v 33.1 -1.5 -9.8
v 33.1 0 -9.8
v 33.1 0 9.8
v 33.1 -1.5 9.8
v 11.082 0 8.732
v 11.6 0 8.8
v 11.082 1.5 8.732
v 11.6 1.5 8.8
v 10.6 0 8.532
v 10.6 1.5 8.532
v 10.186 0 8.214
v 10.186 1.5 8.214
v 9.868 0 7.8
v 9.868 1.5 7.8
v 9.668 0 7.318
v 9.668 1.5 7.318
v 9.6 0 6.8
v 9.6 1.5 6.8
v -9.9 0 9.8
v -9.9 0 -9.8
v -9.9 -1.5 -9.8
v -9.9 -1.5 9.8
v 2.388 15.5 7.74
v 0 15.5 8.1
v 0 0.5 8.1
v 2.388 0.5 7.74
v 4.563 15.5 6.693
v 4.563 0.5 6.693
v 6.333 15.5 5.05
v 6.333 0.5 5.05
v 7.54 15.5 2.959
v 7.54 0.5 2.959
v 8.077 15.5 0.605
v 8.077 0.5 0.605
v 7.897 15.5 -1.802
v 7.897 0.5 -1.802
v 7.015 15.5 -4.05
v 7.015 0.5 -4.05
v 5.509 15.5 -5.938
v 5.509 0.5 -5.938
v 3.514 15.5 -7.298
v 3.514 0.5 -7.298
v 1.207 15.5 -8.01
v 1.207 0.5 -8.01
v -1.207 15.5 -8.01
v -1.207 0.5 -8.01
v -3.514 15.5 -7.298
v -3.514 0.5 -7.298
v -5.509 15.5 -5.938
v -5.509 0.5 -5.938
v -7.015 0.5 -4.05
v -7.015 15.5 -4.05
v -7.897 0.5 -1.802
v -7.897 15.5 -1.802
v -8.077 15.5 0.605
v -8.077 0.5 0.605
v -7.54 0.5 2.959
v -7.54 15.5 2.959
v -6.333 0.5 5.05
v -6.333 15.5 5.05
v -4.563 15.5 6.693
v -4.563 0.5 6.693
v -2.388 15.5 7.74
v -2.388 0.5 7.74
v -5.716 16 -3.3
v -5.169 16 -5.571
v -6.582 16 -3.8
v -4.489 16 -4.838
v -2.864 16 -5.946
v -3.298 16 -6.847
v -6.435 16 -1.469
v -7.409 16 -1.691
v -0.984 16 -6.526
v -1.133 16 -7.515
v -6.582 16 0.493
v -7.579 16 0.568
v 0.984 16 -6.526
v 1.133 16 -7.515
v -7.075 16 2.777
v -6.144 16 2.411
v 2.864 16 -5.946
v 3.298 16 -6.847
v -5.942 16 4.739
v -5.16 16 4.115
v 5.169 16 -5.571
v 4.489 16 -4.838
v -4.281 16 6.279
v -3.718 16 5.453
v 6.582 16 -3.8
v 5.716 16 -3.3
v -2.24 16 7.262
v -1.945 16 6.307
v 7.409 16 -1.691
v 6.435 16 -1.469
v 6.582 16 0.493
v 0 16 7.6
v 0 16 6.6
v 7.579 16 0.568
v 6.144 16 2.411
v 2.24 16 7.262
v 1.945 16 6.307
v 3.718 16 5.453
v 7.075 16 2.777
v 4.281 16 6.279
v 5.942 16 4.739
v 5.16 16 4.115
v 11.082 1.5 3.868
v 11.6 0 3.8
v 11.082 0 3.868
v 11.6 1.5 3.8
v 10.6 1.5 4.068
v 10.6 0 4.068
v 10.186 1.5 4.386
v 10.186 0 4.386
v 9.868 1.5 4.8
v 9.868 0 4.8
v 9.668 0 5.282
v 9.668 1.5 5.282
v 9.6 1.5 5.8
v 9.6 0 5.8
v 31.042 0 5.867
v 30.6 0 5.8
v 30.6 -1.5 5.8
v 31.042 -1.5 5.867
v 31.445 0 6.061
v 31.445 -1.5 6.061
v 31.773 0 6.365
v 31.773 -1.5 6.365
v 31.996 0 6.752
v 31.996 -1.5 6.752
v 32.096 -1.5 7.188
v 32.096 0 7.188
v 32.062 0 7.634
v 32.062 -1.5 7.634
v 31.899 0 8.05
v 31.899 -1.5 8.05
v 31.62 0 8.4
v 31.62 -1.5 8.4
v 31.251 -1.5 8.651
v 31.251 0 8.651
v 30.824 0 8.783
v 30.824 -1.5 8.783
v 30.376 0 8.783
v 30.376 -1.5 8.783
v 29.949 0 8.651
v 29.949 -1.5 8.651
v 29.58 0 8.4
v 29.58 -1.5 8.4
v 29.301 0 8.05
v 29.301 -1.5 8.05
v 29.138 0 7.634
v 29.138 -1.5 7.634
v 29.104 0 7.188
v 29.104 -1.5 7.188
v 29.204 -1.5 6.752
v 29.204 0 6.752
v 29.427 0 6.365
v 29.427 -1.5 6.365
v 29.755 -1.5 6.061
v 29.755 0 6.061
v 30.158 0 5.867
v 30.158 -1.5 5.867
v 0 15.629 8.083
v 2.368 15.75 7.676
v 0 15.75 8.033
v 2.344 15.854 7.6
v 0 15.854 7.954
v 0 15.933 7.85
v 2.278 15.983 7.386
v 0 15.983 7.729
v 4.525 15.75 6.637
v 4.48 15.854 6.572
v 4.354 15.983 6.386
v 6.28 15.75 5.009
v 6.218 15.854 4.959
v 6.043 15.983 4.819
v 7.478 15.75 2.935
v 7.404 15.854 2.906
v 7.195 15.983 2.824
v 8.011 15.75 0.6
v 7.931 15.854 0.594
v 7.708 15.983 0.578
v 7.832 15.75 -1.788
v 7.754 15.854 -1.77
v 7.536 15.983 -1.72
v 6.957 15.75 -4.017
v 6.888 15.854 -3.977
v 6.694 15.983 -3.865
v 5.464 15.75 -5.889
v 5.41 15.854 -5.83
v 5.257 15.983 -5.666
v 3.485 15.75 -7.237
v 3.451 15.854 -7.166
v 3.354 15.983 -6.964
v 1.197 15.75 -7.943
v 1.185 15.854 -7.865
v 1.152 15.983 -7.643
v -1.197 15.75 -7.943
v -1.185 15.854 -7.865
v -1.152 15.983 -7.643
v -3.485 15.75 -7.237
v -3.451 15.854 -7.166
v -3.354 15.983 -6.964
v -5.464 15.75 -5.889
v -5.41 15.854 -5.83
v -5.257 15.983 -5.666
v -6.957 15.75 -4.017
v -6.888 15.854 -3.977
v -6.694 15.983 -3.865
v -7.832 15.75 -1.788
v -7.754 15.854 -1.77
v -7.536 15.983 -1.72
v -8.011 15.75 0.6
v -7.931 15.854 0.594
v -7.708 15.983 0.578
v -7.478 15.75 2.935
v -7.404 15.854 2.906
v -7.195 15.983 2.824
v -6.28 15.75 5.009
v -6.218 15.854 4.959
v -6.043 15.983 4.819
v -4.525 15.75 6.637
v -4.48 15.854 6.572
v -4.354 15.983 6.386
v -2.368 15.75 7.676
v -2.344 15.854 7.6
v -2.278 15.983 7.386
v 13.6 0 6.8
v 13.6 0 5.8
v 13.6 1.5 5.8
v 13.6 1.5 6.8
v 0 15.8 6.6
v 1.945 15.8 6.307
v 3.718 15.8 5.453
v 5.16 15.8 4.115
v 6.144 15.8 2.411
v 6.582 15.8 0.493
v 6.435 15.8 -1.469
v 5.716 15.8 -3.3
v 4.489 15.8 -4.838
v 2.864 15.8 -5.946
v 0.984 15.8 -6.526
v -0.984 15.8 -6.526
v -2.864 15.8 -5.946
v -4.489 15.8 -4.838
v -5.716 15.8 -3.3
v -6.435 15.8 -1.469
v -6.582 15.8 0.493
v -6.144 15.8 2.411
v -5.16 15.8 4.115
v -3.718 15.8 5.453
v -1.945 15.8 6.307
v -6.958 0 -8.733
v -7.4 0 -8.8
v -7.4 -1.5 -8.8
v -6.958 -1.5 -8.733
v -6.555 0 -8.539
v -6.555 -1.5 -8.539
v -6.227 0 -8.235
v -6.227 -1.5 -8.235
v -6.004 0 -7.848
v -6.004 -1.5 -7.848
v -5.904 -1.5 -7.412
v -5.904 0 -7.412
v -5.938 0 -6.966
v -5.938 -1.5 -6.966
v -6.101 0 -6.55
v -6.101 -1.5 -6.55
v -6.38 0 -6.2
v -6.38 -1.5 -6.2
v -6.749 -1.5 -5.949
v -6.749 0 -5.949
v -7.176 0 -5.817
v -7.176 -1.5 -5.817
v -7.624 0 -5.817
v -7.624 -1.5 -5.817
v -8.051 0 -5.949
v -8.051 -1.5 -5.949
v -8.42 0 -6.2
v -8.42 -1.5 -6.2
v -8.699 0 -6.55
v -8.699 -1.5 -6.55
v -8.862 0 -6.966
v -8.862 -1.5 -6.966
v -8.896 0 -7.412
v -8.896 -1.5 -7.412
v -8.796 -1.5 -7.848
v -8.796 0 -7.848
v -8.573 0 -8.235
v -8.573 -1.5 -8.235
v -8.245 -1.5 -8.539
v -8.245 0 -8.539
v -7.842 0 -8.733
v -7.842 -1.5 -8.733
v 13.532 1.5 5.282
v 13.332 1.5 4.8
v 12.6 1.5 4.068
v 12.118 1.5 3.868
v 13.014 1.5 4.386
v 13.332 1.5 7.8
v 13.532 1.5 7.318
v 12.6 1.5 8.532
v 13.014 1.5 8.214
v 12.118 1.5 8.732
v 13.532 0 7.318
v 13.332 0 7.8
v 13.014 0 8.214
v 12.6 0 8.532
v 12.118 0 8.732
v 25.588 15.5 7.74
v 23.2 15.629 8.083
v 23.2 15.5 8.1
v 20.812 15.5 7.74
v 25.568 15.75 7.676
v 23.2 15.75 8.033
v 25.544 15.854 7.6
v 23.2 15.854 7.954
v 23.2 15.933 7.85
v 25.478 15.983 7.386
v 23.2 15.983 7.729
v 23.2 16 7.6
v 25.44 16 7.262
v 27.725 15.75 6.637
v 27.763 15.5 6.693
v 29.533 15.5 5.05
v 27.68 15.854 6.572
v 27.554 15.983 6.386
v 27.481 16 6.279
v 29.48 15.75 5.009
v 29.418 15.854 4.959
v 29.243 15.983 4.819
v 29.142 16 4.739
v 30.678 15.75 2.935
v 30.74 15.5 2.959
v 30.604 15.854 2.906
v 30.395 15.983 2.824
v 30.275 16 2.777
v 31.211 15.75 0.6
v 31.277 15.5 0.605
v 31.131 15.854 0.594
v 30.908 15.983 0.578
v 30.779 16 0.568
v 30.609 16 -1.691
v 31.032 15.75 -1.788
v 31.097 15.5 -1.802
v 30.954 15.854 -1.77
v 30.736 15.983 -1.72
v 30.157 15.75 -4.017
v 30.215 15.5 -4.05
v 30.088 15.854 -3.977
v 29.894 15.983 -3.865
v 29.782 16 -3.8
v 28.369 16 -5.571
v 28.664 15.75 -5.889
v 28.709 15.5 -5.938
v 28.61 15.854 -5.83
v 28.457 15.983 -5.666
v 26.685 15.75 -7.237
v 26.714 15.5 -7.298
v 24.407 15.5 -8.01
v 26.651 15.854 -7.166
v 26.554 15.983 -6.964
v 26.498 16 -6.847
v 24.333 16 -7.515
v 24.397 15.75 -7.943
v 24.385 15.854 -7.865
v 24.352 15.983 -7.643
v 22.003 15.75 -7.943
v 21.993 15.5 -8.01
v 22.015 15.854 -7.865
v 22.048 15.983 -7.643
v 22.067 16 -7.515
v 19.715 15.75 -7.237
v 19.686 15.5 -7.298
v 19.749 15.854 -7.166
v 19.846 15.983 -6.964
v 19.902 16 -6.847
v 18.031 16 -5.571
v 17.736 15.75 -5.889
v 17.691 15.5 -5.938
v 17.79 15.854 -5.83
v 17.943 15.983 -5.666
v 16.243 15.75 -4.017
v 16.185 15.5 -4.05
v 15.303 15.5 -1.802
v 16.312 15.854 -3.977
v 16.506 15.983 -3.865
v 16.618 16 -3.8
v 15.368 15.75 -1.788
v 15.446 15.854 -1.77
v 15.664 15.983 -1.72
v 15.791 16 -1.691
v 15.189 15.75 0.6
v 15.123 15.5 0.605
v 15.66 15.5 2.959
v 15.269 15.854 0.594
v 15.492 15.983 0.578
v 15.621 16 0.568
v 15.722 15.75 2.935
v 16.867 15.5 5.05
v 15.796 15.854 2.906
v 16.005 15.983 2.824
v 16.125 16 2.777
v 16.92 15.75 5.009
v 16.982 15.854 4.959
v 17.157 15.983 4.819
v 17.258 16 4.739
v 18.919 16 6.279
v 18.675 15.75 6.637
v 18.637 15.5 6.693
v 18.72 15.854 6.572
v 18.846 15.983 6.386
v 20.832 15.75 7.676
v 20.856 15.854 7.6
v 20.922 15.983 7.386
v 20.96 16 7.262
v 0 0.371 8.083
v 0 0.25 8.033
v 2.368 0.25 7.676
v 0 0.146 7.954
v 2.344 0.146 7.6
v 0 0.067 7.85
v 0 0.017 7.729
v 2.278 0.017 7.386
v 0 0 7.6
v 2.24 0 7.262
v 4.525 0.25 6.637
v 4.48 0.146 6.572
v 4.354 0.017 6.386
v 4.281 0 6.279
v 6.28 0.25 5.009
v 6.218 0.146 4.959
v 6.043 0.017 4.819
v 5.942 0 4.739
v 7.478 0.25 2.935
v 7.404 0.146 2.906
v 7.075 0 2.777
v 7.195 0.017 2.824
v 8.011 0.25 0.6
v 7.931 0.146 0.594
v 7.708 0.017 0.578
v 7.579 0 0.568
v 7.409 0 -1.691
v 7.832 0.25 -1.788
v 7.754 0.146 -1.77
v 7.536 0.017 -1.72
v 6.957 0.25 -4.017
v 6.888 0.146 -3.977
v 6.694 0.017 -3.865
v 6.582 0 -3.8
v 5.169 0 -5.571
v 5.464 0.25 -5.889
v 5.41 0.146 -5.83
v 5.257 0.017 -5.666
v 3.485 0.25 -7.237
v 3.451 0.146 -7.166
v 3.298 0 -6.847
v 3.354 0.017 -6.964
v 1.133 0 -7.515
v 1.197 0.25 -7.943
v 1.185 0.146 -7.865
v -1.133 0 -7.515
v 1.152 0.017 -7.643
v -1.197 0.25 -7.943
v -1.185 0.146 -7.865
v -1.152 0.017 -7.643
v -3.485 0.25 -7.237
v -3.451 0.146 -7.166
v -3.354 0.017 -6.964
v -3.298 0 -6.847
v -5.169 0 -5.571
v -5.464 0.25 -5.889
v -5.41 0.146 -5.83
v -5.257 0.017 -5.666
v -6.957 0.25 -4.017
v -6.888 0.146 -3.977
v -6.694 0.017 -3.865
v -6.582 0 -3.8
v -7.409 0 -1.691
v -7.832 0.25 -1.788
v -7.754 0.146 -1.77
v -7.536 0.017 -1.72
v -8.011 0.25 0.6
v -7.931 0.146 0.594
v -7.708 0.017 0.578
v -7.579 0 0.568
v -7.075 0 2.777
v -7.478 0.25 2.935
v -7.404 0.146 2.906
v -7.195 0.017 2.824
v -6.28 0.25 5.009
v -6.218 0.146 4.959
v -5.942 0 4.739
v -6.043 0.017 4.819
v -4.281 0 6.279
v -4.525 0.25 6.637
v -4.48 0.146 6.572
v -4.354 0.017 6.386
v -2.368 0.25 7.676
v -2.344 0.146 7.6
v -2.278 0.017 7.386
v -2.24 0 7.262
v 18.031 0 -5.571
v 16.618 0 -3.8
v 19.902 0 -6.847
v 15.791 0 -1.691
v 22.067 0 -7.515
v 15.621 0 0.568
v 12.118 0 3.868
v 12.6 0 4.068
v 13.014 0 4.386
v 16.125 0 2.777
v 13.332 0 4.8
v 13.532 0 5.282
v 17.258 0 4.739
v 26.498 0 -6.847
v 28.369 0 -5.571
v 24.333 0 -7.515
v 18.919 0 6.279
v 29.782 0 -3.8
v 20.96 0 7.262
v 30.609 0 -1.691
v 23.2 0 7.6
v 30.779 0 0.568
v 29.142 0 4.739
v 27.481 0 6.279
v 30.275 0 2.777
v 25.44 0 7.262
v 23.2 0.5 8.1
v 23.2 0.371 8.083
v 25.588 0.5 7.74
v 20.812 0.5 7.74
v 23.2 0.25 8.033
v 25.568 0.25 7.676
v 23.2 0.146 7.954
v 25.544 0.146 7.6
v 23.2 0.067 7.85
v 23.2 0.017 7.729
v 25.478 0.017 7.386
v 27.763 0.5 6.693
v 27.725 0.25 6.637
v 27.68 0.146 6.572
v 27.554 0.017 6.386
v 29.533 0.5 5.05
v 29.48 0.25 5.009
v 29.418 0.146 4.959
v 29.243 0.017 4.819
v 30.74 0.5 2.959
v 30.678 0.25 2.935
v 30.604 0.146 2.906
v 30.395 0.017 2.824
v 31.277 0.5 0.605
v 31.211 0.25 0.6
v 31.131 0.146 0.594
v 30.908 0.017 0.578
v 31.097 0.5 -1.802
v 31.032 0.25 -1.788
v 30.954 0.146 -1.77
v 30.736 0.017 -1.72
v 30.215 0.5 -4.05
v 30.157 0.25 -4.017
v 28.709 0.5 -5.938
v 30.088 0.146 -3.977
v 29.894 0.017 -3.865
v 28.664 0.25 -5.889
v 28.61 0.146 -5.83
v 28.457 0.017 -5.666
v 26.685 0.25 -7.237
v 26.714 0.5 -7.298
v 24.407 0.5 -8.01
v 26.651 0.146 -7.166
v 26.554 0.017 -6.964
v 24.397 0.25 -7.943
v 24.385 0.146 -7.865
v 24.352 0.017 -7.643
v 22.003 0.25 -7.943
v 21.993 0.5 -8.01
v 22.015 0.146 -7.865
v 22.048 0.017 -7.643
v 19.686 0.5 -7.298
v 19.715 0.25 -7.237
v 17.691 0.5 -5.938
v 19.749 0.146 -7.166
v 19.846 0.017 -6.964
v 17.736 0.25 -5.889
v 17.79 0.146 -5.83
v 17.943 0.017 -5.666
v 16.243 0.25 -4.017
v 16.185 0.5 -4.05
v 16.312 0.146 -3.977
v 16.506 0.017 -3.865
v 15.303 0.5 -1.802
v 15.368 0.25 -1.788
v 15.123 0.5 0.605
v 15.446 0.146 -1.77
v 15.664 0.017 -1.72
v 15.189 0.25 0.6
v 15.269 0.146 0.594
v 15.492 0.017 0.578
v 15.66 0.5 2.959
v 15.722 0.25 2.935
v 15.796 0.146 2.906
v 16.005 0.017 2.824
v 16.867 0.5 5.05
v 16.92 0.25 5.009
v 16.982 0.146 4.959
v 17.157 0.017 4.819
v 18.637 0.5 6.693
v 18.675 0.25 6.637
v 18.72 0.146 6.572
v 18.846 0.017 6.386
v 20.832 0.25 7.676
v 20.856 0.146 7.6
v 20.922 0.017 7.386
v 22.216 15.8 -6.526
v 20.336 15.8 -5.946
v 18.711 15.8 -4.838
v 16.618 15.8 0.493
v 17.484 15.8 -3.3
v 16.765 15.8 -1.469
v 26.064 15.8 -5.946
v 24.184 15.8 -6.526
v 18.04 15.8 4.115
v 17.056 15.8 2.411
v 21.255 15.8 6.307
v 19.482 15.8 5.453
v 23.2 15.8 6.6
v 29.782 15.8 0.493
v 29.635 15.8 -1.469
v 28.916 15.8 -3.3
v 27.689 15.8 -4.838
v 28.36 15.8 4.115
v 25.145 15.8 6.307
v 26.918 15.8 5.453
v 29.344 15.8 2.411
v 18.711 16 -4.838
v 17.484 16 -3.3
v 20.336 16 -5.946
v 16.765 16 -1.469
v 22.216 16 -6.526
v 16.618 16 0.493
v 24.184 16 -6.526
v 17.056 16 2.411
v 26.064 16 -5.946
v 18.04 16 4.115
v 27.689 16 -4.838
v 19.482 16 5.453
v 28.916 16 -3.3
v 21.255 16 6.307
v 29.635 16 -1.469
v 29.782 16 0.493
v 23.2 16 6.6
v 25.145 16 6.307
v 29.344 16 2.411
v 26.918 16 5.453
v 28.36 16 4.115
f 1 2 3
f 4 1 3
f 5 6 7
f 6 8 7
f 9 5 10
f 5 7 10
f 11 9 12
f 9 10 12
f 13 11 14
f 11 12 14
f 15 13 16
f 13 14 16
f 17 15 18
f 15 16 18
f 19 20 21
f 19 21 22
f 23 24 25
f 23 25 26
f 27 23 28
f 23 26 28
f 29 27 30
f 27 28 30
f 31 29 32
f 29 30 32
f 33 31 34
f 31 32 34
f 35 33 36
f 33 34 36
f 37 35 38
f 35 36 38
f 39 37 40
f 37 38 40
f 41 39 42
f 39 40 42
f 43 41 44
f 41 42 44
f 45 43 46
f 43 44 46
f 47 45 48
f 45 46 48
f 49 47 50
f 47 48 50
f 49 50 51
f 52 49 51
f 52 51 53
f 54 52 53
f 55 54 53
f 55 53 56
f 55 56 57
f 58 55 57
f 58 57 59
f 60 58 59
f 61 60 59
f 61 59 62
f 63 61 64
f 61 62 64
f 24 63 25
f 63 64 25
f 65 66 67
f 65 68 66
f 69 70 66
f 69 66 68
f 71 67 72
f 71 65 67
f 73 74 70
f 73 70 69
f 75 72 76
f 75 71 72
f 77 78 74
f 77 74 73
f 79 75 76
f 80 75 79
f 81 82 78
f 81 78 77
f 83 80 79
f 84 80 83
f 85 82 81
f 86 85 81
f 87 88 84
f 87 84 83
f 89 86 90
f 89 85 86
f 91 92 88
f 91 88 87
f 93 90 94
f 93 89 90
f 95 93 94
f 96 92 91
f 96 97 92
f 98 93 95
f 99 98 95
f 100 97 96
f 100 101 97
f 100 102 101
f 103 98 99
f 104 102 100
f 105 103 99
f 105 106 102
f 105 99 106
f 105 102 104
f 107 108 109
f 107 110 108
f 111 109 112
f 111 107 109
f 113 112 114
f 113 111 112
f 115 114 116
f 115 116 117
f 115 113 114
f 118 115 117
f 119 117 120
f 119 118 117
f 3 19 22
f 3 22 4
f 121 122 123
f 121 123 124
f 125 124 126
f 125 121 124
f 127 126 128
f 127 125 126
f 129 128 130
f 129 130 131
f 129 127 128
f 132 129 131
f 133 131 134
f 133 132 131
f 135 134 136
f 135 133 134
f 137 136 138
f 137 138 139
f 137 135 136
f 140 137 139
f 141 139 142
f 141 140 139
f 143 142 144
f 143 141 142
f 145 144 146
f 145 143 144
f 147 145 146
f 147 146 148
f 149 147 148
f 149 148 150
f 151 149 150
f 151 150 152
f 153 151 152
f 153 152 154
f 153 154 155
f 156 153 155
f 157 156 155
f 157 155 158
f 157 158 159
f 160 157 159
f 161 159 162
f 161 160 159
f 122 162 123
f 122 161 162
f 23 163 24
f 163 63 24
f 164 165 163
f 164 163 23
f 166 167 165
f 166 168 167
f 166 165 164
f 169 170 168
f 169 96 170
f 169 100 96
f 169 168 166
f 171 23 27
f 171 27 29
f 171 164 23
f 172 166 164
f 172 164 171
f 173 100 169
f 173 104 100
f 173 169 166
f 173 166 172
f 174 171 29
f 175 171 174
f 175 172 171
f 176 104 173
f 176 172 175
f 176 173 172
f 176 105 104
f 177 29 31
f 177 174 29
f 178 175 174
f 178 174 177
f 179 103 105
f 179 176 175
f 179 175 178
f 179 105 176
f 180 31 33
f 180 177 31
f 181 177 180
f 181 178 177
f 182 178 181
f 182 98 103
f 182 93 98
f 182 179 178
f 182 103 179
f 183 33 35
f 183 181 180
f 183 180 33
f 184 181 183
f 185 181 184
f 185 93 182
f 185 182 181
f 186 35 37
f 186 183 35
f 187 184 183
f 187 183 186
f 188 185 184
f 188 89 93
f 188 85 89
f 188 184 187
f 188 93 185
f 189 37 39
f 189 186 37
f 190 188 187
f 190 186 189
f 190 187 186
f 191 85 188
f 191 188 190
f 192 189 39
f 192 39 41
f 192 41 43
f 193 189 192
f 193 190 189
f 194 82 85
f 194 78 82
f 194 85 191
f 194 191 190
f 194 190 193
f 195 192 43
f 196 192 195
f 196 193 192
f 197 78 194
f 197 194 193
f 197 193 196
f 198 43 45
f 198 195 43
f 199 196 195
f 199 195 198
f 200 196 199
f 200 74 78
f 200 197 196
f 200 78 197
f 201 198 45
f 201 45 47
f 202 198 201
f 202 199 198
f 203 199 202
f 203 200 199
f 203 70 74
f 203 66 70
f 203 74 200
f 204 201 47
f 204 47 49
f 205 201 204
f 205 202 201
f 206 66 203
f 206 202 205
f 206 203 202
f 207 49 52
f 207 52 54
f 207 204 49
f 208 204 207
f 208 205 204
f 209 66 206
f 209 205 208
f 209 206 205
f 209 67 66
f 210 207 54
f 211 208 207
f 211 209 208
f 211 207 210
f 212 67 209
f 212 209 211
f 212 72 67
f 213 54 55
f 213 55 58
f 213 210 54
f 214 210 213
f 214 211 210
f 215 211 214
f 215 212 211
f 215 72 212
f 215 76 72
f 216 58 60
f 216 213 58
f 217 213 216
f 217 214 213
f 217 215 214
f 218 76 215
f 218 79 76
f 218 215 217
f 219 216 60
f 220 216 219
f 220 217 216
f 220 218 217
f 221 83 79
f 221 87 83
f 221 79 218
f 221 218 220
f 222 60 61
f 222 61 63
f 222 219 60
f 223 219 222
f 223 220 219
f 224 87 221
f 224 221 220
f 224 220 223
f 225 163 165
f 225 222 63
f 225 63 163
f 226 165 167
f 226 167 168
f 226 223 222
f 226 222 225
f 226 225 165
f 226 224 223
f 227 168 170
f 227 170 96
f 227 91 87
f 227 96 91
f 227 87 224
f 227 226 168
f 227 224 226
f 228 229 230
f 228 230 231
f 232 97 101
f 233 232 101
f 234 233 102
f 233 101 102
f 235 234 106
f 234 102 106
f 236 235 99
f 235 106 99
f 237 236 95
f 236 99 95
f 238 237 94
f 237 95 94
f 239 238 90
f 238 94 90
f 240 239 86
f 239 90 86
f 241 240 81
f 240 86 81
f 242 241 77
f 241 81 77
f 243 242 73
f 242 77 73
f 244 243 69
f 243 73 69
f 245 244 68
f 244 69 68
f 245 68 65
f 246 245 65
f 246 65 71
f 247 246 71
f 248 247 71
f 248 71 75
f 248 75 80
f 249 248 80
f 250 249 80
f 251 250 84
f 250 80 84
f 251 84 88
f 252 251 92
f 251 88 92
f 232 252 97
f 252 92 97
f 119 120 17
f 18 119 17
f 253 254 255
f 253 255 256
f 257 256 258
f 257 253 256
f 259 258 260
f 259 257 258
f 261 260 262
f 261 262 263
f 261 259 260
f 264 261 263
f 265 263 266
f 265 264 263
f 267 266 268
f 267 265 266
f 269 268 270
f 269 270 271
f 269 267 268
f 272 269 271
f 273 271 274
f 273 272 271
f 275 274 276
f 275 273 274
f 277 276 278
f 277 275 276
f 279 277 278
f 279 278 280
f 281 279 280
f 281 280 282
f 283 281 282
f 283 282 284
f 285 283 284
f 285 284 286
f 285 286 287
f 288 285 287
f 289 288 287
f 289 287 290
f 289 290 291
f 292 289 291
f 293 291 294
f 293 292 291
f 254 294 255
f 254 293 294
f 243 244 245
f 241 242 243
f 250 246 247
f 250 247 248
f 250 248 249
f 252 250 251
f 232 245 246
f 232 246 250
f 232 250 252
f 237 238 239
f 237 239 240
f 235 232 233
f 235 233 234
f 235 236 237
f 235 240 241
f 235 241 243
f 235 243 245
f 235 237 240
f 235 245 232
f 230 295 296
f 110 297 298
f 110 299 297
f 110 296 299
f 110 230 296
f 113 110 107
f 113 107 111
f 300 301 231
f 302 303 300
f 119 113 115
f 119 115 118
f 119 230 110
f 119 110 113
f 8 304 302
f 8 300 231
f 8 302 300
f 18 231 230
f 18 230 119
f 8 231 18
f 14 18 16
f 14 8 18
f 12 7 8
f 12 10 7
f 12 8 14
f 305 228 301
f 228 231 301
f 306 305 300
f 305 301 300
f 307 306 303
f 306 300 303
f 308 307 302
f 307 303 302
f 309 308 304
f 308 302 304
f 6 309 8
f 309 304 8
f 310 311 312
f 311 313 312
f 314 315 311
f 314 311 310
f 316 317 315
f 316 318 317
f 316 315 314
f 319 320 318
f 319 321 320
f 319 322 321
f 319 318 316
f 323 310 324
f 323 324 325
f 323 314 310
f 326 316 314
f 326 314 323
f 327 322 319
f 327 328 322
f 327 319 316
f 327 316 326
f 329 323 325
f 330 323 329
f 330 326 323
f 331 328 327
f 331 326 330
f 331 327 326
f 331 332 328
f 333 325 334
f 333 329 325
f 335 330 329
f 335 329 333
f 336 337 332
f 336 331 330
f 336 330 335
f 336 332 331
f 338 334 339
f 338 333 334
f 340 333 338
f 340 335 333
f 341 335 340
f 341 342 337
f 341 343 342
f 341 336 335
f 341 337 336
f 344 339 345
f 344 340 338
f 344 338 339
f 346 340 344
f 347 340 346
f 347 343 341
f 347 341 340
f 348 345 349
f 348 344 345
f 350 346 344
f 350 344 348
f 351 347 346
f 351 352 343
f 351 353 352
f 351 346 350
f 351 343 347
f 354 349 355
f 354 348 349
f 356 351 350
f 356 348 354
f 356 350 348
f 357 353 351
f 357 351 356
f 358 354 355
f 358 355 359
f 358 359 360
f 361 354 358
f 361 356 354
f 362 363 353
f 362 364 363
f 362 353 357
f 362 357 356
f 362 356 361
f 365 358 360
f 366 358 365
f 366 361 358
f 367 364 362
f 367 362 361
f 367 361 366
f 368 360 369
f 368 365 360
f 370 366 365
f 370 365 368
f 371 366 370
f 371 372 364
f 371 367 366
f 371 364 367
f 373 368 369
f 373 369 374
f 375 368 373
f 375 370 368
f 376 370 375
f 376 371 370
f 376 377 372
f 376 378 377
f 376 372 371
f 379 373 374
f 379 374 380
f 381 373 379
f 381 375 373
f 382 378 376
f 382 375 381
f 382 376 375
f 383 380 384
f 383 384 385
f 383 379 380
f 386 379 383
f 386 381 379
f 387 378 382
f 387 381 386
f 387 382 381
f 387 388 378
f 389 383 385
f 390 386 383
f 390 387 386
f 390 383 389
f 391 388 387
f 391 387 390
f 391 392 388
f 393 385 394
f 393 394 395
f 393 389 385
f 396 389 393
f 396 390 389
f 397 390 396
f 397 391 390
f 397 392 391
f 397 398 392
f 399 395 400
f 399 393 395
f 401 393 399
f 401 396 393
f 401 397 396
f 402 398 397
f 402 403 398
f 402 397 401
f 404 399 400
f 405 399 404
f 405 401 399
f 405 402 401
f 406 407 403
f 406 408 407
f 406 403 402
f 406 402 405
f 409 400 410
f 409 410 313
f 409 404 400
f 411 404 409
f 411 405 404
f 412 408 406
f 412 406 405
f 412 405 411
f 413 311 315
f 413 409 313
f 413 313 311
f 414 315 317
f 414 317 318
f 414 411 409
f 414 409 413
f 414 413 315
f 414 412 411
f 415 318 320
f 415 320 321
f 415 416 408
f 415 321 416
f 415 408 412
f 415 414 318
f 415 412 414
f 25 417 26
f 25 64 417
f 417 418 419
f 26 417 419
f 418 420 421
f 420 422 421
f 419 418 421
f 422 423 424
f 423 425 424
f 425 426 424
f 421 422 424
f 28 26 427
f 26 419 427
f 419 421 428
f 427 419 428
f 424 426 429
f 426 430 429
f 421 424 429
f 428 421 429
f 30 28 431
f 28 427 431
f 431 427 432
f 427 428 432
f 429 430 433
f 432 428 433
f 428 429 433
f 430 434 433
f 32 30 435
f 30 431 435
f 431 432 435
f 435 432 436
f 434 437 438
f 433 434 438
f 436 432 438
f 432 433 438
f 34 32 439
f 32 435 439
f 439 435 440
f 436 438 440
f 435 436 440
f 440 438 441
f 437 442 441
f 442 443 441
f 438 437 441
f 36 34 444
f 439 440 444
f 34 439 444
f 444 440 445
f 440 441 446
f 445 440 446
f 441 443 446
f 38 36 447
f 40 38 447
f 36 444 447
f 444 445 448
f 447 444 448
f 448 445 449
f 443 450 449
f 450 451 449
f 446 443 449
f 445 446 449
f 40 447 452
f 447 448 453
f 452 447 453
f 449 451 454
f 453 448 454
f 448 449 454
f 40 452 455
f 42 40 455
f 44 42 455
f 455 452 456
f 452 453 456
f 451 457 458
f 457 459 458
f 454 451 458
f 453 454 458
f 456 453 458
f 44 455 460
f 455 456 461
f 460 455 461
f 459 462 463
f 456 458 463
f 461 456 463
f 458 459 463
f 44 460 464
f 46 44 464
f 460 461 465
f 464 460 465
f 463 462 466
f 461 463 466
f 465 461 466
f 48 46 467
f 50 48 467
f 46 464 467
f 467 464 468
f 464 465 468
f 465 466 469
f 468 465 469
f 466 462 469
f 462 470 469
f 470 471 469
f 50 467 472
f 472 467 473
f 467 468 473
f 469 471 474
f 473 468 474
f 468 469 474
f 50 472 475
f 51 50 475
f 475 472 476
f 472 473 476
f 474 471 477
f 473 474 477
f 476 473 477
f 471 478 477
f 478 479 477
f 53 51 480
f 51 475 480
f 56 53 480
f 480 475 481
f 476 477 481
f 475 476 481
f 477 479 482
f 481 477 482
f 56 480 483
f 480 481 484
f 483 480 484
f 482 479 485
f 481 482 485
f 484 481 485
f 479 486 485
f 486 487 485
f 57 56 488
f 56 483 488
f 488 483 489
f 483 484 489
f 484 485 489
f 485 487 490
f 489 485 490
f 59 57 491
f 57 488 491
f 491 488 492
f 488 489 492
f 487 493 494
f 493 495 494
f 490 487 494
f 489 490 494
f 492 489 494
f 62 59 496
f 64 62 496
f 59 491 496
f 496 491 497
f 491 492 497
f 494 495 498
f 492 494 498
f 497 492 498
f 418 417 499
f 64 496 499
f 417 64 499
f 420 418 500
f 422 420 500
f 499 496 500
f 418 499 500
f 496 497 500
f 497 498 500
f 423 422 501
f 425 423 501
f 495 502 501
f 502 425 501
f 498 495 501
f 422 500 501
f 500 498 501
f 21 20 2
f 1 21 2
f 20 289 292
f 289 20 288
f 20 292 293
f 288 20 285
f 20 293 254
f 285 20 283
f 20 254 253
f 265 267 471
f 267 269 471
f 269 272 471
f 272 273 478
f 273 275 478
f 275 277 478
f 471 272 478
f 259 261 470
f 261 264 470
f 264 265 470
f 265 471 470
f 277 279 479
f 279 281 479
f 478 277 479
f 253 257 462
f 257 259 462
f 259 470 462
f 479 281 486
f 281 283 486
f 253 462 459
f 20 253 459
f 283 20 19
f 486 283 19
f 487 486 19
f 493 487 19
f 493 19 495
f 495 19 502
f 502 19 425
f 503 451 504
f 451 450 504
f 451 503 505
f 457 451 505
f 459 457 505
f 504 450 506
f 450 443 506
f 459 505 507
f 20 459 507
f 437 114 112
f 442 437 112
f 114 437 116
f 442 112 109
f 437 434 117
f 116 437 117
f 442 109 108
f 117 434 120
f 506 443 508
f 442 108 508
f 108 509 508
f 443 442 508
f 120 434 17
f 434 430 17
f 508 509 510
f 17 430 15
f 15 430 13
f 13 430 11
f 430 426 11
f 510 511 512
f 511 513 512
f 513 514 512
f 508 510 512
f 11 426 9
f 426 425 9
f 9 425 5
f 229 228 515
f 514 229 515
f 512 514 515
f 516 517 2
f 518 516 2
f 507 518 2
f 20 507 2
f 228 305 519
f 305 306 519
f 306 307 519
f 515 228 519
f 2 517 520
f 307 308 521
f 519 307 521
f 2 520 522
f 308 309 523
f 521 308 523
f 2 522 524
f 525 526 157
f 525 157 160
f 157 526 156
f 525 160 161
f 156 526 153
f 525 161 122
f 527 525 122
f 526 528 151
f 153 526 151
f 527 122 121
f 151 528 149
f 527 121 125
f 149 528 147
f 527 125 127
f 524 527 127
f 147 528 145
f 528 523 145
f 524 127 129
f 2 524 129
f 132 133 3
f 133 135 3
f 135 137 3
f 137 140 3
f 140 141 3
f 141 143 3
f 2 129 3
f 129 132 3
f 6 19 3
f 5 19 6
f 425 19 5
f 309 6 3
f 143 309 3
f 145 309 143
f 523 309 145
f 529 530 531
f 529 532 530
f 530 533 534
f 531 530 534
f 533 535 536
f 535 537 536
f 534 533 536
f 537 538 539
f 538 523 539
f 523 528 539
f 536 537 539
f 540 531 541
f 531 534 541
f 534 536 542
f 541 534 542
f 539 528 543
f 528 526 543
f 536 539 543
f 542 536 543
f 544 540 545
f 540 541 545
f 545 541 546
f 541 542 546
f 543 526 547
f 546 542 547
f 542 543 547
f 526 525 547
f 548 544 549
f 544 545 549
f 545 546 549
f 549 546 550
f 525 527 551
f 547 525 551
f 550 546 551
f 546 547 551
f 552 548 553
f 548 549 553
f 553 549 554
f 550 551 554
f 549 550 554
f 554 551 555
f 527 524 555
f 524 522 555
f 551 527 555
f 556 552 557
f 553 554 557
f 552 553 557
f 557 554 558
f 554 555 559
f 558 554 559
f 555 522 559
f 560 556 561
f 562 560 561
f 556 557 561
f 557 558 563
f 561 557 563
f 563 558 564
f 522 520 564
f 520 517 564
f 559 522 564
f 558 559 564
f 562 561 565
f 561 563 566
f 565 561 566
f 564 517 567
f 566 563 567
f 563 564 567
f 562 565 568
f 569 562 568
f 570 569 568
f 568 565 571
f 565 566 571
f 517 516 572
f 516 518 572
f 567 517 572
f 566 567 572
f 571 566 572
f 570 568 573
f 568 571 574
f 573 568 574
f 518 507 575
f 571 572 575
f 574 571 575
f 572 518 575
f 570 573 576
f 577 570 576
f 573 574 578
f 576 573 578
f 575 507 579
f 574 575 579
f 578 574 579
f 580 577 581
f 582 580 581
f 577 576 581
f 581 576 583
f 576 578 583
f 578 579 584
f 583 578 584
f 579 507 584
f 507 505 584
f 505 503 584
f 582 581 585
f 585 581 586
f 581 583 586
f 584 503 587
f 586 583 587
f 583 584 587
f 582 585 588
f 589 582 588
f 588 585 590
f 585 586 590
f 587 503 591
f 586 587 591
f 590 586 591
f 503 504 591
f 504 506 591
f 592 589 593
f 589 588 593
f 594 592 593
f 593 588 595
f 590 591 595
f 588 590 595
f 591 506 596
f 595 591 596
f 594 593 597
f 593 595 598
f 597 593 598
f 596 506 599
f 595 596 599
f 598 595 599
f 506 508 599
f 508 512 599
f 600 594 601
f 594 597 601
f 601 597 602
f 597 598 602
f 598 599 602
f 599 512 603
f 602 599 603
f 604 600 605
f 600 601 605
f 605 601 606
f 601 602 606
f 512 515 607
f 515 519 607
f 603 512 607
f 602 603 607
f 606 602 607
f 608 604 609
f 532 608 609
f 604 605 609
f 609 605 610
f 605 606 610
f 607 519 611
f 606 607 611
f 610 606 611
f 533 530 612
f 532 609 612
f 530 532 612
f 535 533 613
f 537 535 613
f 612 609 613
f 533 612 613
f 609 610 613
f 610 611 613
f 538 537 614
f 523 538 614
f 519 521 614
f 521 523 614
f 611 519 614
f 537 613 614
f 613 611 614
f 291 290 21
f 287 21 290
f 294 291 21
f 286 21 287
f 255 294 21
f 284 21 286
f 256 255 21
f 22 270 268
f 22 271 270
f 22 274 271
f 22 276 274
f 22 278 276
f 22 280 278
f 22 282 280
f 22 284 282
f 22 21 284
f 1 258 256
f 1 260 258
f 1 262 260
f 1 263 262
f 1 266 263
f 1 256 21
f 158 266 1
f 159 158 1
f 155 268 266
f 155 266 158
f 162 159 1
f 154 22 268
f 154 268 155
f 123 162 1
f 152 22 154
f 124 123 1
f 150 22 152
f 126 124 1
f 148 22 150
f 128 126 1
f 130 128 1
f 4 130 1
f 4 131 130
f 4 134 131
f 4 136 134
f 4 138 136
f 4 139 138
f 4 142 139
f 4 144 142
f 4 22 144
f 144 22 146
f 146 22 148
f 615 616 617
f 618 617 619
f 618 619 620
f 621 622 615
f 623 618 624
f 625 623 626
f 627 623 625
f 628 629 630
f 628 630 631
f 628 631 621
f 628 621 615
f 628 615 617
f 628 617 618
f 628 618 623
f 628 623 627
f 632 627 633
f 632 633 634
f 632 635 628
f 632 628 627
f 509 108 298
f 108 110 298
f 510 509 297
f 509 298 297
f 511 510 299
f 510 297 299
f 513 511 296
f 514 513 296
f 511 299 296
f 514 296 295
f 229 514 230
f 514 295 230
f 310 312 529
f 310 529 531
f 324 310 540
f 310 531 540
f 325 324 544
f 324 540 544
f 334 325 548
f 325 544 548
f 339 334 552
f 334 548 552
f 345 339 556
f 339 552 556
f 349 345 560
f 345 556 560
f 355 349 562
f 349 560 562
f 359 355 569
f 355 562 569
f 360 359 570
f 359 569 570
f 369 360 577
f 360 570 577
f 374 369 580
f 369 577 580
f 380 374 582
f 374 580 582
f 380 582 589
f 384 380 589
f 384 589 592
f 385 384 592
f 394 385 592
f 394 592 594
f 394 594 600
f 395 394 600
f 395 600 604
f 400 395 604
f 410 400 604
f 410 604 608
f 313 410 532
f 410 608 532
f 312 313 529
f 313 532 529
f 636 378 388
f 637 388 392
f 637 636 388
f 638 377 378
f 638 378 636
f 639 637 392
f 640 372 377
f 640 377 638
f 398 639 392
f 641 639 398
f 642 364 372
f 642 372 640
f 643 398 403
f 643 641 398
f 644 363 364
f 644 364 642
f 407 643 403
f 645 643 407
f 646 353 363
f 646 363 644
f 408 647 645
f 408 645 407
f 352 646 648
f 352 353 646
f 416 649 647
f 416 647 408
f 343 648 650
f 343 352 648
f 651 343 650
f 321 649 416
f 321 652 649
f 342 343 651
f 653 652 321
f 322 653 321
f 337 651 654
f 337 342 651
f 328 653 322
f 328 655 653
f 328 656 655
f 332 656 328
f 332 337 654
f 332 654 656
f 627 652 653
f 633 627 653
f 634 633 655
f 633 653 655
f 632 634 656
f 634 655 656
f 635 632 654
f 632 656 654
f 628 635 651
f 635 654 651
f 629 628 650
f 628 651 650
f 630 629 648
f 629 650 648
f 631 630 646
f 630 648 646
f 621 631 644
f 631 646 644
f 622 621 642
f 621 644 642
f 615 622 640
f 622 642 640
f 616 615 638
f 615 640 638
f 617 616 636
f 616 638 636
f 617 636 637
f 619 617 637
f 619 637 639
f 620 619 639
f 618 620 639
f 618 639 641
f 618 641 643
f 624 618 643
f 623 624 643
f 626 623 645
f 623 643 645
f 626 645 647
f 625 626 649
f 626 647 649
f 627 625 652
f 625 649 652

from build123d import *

# Parameters (mm, degrees)
SKETCH1_R          = 8.1
EXTRUDE1_DEPTH     = 16
EXTRUDE1_2_DEPTH   = 16
FILLET1_R          = 0.5
SKETCH2_R          = 6.6
CUT_EXTRUDE2_DEPTH = 0.2
FILLET2_R          = 0.5
SKETCH3_W          = 43
SKETCH3_H          = 19.6
SKETCH3_R          = 1.5
EXTRUDE2_DEPTH     = 1.5
SKETCH4_W          = 2
SKETCH4_H          = 5
EXTRUDE3_DEPTH     = 1.5
FILLET3_R          = 2


with BuildPart() as part:
    # Sketch1 → Extrude1 (new body)
    with BuildSketch(Plane(origin=(0, 0, 0), x_dir=(1, 0, 0), z_dir=(0, 1, 0))):
        with Locations(Location((0, 0, 0), (0, 0, 270))):
            Circle(SKETCH1_R)
    extrude(amount=EXTRUDE1_DEPTH)

    # Fillet1
    fillet1_edges = [part.edges().sort_by_distance(p)[0] for p in [
        (0, 0, -8.1),
        (0, 16, -8.1),
    ]]
    fillet(fillet1_edges, radius=FILLET1_R)


with BuildPart() as body_2:
    # Sketch1 → Extrude1 2 (new body)
    with BuildSketch(Plane(origin=(0, 0, 0), x_dir=(1, 0, 0), z_dir=(0, 1, 0))):
        with Locations(Location((23.2, 0, 0), (0, 0, 270))):
            Circle(SKETCH1_R)
    extrude(amount=EXTRUDE1_2_DEPTH)


with BuildPart() as cut_extrude2_tool:
    # Sketch2 → Cut-Extrude2 (new body)
    with BuildSketch(Plane(origin=(0, 16, 0), x_dir=(-1, 0, 0), z_dir=(0, 1, 0))):
        with Locations(Location((-23.2, 0, 0), (0, 0, 90))):
            Circle(SKETCH2_R)
        with Locations(Location((0, 0, 0), (0, 0, 90))):
            Circle(SKETCH2_R)
    extrude(amount=-CUT_EXTRUDE2_DEPTH)


with BuildPart() as part_1:
    add(part.part)

    # Cut-Extrude2: cut by cut_extrude2_tool
    add(cut_extrude2_tool.part, mode=Mode.SUBTRACT)



with BuildPart() as body_2_1:
    add(body_2.part)

    # Cut-Extrude2: cut by cut_extrude2_tool
    add(cut_extrude2_tool.part, mode=Mode.SUBTRACT)

    # Fillet2
    fillet2_edges = [body_2_1.edges().sort_by_distance(p)[0] for p in [
        (23.2, 0, -8.1),
        (23.2, 16, -8.1),
    ]]
    fillet(fillet2_edges, radius=FILLET2_R)


with BuildPart() as part_2:
    add(part_1.part)

    add(body_2_1.part)  # Extrude2 merges body 2
    # Sketch3 → Extrude2 (add)
    with BuildSketch(Plane.XZ):
        with Locations((11.6, 0)):
            Rectangle(SKETCH3_W, SKETCH3_H)
        with Locations(Location((-7.4, -7.3, 0), (0, 0, 270))):
            Circle(SKETCH3_R, mode=Mode.SUBTRACT)
        with Locations(Location((30.6, 7.3, 0), (0, 0, 270))):
            Circle(SKETCH3_R, mode=Mode.SUBTRACT)
    extrude(amount=EXTRUDE2_DEPTH)

    # Sketch4 → Extrude3 (add)
    with BuildSketch(Plane(origin=(0, 0, 0), x_dir=(-1, 0, 0), z_dir=(0, 1, 0))):
        with Locations((-10.6, 6.3)):
            Rectangle(SKETCH4_W, SKETCH4_H)
        with Locations((-12.6, 6.3)):
            Rectangle(SKETCH4_W, SKETCH4_H)
    extrude(amount=EXTRUDE3_DEPTH)

    # Fillet3
    fillet3_edges = [part_2.edges().sort_by_distance(p)[0] for p in [
        (9.6, 0.75, 3.8),
        (13.6, 0.75, 3.8),
        (9.6, 0.75, 8.8),
        (13.6, 0.75, 8.8),
    ]]
    fillet(fillet3_edges, radius=FILLET3_R - 0.0001)  # a hair under: the kernel refuses the full size


solid = part_2.part
